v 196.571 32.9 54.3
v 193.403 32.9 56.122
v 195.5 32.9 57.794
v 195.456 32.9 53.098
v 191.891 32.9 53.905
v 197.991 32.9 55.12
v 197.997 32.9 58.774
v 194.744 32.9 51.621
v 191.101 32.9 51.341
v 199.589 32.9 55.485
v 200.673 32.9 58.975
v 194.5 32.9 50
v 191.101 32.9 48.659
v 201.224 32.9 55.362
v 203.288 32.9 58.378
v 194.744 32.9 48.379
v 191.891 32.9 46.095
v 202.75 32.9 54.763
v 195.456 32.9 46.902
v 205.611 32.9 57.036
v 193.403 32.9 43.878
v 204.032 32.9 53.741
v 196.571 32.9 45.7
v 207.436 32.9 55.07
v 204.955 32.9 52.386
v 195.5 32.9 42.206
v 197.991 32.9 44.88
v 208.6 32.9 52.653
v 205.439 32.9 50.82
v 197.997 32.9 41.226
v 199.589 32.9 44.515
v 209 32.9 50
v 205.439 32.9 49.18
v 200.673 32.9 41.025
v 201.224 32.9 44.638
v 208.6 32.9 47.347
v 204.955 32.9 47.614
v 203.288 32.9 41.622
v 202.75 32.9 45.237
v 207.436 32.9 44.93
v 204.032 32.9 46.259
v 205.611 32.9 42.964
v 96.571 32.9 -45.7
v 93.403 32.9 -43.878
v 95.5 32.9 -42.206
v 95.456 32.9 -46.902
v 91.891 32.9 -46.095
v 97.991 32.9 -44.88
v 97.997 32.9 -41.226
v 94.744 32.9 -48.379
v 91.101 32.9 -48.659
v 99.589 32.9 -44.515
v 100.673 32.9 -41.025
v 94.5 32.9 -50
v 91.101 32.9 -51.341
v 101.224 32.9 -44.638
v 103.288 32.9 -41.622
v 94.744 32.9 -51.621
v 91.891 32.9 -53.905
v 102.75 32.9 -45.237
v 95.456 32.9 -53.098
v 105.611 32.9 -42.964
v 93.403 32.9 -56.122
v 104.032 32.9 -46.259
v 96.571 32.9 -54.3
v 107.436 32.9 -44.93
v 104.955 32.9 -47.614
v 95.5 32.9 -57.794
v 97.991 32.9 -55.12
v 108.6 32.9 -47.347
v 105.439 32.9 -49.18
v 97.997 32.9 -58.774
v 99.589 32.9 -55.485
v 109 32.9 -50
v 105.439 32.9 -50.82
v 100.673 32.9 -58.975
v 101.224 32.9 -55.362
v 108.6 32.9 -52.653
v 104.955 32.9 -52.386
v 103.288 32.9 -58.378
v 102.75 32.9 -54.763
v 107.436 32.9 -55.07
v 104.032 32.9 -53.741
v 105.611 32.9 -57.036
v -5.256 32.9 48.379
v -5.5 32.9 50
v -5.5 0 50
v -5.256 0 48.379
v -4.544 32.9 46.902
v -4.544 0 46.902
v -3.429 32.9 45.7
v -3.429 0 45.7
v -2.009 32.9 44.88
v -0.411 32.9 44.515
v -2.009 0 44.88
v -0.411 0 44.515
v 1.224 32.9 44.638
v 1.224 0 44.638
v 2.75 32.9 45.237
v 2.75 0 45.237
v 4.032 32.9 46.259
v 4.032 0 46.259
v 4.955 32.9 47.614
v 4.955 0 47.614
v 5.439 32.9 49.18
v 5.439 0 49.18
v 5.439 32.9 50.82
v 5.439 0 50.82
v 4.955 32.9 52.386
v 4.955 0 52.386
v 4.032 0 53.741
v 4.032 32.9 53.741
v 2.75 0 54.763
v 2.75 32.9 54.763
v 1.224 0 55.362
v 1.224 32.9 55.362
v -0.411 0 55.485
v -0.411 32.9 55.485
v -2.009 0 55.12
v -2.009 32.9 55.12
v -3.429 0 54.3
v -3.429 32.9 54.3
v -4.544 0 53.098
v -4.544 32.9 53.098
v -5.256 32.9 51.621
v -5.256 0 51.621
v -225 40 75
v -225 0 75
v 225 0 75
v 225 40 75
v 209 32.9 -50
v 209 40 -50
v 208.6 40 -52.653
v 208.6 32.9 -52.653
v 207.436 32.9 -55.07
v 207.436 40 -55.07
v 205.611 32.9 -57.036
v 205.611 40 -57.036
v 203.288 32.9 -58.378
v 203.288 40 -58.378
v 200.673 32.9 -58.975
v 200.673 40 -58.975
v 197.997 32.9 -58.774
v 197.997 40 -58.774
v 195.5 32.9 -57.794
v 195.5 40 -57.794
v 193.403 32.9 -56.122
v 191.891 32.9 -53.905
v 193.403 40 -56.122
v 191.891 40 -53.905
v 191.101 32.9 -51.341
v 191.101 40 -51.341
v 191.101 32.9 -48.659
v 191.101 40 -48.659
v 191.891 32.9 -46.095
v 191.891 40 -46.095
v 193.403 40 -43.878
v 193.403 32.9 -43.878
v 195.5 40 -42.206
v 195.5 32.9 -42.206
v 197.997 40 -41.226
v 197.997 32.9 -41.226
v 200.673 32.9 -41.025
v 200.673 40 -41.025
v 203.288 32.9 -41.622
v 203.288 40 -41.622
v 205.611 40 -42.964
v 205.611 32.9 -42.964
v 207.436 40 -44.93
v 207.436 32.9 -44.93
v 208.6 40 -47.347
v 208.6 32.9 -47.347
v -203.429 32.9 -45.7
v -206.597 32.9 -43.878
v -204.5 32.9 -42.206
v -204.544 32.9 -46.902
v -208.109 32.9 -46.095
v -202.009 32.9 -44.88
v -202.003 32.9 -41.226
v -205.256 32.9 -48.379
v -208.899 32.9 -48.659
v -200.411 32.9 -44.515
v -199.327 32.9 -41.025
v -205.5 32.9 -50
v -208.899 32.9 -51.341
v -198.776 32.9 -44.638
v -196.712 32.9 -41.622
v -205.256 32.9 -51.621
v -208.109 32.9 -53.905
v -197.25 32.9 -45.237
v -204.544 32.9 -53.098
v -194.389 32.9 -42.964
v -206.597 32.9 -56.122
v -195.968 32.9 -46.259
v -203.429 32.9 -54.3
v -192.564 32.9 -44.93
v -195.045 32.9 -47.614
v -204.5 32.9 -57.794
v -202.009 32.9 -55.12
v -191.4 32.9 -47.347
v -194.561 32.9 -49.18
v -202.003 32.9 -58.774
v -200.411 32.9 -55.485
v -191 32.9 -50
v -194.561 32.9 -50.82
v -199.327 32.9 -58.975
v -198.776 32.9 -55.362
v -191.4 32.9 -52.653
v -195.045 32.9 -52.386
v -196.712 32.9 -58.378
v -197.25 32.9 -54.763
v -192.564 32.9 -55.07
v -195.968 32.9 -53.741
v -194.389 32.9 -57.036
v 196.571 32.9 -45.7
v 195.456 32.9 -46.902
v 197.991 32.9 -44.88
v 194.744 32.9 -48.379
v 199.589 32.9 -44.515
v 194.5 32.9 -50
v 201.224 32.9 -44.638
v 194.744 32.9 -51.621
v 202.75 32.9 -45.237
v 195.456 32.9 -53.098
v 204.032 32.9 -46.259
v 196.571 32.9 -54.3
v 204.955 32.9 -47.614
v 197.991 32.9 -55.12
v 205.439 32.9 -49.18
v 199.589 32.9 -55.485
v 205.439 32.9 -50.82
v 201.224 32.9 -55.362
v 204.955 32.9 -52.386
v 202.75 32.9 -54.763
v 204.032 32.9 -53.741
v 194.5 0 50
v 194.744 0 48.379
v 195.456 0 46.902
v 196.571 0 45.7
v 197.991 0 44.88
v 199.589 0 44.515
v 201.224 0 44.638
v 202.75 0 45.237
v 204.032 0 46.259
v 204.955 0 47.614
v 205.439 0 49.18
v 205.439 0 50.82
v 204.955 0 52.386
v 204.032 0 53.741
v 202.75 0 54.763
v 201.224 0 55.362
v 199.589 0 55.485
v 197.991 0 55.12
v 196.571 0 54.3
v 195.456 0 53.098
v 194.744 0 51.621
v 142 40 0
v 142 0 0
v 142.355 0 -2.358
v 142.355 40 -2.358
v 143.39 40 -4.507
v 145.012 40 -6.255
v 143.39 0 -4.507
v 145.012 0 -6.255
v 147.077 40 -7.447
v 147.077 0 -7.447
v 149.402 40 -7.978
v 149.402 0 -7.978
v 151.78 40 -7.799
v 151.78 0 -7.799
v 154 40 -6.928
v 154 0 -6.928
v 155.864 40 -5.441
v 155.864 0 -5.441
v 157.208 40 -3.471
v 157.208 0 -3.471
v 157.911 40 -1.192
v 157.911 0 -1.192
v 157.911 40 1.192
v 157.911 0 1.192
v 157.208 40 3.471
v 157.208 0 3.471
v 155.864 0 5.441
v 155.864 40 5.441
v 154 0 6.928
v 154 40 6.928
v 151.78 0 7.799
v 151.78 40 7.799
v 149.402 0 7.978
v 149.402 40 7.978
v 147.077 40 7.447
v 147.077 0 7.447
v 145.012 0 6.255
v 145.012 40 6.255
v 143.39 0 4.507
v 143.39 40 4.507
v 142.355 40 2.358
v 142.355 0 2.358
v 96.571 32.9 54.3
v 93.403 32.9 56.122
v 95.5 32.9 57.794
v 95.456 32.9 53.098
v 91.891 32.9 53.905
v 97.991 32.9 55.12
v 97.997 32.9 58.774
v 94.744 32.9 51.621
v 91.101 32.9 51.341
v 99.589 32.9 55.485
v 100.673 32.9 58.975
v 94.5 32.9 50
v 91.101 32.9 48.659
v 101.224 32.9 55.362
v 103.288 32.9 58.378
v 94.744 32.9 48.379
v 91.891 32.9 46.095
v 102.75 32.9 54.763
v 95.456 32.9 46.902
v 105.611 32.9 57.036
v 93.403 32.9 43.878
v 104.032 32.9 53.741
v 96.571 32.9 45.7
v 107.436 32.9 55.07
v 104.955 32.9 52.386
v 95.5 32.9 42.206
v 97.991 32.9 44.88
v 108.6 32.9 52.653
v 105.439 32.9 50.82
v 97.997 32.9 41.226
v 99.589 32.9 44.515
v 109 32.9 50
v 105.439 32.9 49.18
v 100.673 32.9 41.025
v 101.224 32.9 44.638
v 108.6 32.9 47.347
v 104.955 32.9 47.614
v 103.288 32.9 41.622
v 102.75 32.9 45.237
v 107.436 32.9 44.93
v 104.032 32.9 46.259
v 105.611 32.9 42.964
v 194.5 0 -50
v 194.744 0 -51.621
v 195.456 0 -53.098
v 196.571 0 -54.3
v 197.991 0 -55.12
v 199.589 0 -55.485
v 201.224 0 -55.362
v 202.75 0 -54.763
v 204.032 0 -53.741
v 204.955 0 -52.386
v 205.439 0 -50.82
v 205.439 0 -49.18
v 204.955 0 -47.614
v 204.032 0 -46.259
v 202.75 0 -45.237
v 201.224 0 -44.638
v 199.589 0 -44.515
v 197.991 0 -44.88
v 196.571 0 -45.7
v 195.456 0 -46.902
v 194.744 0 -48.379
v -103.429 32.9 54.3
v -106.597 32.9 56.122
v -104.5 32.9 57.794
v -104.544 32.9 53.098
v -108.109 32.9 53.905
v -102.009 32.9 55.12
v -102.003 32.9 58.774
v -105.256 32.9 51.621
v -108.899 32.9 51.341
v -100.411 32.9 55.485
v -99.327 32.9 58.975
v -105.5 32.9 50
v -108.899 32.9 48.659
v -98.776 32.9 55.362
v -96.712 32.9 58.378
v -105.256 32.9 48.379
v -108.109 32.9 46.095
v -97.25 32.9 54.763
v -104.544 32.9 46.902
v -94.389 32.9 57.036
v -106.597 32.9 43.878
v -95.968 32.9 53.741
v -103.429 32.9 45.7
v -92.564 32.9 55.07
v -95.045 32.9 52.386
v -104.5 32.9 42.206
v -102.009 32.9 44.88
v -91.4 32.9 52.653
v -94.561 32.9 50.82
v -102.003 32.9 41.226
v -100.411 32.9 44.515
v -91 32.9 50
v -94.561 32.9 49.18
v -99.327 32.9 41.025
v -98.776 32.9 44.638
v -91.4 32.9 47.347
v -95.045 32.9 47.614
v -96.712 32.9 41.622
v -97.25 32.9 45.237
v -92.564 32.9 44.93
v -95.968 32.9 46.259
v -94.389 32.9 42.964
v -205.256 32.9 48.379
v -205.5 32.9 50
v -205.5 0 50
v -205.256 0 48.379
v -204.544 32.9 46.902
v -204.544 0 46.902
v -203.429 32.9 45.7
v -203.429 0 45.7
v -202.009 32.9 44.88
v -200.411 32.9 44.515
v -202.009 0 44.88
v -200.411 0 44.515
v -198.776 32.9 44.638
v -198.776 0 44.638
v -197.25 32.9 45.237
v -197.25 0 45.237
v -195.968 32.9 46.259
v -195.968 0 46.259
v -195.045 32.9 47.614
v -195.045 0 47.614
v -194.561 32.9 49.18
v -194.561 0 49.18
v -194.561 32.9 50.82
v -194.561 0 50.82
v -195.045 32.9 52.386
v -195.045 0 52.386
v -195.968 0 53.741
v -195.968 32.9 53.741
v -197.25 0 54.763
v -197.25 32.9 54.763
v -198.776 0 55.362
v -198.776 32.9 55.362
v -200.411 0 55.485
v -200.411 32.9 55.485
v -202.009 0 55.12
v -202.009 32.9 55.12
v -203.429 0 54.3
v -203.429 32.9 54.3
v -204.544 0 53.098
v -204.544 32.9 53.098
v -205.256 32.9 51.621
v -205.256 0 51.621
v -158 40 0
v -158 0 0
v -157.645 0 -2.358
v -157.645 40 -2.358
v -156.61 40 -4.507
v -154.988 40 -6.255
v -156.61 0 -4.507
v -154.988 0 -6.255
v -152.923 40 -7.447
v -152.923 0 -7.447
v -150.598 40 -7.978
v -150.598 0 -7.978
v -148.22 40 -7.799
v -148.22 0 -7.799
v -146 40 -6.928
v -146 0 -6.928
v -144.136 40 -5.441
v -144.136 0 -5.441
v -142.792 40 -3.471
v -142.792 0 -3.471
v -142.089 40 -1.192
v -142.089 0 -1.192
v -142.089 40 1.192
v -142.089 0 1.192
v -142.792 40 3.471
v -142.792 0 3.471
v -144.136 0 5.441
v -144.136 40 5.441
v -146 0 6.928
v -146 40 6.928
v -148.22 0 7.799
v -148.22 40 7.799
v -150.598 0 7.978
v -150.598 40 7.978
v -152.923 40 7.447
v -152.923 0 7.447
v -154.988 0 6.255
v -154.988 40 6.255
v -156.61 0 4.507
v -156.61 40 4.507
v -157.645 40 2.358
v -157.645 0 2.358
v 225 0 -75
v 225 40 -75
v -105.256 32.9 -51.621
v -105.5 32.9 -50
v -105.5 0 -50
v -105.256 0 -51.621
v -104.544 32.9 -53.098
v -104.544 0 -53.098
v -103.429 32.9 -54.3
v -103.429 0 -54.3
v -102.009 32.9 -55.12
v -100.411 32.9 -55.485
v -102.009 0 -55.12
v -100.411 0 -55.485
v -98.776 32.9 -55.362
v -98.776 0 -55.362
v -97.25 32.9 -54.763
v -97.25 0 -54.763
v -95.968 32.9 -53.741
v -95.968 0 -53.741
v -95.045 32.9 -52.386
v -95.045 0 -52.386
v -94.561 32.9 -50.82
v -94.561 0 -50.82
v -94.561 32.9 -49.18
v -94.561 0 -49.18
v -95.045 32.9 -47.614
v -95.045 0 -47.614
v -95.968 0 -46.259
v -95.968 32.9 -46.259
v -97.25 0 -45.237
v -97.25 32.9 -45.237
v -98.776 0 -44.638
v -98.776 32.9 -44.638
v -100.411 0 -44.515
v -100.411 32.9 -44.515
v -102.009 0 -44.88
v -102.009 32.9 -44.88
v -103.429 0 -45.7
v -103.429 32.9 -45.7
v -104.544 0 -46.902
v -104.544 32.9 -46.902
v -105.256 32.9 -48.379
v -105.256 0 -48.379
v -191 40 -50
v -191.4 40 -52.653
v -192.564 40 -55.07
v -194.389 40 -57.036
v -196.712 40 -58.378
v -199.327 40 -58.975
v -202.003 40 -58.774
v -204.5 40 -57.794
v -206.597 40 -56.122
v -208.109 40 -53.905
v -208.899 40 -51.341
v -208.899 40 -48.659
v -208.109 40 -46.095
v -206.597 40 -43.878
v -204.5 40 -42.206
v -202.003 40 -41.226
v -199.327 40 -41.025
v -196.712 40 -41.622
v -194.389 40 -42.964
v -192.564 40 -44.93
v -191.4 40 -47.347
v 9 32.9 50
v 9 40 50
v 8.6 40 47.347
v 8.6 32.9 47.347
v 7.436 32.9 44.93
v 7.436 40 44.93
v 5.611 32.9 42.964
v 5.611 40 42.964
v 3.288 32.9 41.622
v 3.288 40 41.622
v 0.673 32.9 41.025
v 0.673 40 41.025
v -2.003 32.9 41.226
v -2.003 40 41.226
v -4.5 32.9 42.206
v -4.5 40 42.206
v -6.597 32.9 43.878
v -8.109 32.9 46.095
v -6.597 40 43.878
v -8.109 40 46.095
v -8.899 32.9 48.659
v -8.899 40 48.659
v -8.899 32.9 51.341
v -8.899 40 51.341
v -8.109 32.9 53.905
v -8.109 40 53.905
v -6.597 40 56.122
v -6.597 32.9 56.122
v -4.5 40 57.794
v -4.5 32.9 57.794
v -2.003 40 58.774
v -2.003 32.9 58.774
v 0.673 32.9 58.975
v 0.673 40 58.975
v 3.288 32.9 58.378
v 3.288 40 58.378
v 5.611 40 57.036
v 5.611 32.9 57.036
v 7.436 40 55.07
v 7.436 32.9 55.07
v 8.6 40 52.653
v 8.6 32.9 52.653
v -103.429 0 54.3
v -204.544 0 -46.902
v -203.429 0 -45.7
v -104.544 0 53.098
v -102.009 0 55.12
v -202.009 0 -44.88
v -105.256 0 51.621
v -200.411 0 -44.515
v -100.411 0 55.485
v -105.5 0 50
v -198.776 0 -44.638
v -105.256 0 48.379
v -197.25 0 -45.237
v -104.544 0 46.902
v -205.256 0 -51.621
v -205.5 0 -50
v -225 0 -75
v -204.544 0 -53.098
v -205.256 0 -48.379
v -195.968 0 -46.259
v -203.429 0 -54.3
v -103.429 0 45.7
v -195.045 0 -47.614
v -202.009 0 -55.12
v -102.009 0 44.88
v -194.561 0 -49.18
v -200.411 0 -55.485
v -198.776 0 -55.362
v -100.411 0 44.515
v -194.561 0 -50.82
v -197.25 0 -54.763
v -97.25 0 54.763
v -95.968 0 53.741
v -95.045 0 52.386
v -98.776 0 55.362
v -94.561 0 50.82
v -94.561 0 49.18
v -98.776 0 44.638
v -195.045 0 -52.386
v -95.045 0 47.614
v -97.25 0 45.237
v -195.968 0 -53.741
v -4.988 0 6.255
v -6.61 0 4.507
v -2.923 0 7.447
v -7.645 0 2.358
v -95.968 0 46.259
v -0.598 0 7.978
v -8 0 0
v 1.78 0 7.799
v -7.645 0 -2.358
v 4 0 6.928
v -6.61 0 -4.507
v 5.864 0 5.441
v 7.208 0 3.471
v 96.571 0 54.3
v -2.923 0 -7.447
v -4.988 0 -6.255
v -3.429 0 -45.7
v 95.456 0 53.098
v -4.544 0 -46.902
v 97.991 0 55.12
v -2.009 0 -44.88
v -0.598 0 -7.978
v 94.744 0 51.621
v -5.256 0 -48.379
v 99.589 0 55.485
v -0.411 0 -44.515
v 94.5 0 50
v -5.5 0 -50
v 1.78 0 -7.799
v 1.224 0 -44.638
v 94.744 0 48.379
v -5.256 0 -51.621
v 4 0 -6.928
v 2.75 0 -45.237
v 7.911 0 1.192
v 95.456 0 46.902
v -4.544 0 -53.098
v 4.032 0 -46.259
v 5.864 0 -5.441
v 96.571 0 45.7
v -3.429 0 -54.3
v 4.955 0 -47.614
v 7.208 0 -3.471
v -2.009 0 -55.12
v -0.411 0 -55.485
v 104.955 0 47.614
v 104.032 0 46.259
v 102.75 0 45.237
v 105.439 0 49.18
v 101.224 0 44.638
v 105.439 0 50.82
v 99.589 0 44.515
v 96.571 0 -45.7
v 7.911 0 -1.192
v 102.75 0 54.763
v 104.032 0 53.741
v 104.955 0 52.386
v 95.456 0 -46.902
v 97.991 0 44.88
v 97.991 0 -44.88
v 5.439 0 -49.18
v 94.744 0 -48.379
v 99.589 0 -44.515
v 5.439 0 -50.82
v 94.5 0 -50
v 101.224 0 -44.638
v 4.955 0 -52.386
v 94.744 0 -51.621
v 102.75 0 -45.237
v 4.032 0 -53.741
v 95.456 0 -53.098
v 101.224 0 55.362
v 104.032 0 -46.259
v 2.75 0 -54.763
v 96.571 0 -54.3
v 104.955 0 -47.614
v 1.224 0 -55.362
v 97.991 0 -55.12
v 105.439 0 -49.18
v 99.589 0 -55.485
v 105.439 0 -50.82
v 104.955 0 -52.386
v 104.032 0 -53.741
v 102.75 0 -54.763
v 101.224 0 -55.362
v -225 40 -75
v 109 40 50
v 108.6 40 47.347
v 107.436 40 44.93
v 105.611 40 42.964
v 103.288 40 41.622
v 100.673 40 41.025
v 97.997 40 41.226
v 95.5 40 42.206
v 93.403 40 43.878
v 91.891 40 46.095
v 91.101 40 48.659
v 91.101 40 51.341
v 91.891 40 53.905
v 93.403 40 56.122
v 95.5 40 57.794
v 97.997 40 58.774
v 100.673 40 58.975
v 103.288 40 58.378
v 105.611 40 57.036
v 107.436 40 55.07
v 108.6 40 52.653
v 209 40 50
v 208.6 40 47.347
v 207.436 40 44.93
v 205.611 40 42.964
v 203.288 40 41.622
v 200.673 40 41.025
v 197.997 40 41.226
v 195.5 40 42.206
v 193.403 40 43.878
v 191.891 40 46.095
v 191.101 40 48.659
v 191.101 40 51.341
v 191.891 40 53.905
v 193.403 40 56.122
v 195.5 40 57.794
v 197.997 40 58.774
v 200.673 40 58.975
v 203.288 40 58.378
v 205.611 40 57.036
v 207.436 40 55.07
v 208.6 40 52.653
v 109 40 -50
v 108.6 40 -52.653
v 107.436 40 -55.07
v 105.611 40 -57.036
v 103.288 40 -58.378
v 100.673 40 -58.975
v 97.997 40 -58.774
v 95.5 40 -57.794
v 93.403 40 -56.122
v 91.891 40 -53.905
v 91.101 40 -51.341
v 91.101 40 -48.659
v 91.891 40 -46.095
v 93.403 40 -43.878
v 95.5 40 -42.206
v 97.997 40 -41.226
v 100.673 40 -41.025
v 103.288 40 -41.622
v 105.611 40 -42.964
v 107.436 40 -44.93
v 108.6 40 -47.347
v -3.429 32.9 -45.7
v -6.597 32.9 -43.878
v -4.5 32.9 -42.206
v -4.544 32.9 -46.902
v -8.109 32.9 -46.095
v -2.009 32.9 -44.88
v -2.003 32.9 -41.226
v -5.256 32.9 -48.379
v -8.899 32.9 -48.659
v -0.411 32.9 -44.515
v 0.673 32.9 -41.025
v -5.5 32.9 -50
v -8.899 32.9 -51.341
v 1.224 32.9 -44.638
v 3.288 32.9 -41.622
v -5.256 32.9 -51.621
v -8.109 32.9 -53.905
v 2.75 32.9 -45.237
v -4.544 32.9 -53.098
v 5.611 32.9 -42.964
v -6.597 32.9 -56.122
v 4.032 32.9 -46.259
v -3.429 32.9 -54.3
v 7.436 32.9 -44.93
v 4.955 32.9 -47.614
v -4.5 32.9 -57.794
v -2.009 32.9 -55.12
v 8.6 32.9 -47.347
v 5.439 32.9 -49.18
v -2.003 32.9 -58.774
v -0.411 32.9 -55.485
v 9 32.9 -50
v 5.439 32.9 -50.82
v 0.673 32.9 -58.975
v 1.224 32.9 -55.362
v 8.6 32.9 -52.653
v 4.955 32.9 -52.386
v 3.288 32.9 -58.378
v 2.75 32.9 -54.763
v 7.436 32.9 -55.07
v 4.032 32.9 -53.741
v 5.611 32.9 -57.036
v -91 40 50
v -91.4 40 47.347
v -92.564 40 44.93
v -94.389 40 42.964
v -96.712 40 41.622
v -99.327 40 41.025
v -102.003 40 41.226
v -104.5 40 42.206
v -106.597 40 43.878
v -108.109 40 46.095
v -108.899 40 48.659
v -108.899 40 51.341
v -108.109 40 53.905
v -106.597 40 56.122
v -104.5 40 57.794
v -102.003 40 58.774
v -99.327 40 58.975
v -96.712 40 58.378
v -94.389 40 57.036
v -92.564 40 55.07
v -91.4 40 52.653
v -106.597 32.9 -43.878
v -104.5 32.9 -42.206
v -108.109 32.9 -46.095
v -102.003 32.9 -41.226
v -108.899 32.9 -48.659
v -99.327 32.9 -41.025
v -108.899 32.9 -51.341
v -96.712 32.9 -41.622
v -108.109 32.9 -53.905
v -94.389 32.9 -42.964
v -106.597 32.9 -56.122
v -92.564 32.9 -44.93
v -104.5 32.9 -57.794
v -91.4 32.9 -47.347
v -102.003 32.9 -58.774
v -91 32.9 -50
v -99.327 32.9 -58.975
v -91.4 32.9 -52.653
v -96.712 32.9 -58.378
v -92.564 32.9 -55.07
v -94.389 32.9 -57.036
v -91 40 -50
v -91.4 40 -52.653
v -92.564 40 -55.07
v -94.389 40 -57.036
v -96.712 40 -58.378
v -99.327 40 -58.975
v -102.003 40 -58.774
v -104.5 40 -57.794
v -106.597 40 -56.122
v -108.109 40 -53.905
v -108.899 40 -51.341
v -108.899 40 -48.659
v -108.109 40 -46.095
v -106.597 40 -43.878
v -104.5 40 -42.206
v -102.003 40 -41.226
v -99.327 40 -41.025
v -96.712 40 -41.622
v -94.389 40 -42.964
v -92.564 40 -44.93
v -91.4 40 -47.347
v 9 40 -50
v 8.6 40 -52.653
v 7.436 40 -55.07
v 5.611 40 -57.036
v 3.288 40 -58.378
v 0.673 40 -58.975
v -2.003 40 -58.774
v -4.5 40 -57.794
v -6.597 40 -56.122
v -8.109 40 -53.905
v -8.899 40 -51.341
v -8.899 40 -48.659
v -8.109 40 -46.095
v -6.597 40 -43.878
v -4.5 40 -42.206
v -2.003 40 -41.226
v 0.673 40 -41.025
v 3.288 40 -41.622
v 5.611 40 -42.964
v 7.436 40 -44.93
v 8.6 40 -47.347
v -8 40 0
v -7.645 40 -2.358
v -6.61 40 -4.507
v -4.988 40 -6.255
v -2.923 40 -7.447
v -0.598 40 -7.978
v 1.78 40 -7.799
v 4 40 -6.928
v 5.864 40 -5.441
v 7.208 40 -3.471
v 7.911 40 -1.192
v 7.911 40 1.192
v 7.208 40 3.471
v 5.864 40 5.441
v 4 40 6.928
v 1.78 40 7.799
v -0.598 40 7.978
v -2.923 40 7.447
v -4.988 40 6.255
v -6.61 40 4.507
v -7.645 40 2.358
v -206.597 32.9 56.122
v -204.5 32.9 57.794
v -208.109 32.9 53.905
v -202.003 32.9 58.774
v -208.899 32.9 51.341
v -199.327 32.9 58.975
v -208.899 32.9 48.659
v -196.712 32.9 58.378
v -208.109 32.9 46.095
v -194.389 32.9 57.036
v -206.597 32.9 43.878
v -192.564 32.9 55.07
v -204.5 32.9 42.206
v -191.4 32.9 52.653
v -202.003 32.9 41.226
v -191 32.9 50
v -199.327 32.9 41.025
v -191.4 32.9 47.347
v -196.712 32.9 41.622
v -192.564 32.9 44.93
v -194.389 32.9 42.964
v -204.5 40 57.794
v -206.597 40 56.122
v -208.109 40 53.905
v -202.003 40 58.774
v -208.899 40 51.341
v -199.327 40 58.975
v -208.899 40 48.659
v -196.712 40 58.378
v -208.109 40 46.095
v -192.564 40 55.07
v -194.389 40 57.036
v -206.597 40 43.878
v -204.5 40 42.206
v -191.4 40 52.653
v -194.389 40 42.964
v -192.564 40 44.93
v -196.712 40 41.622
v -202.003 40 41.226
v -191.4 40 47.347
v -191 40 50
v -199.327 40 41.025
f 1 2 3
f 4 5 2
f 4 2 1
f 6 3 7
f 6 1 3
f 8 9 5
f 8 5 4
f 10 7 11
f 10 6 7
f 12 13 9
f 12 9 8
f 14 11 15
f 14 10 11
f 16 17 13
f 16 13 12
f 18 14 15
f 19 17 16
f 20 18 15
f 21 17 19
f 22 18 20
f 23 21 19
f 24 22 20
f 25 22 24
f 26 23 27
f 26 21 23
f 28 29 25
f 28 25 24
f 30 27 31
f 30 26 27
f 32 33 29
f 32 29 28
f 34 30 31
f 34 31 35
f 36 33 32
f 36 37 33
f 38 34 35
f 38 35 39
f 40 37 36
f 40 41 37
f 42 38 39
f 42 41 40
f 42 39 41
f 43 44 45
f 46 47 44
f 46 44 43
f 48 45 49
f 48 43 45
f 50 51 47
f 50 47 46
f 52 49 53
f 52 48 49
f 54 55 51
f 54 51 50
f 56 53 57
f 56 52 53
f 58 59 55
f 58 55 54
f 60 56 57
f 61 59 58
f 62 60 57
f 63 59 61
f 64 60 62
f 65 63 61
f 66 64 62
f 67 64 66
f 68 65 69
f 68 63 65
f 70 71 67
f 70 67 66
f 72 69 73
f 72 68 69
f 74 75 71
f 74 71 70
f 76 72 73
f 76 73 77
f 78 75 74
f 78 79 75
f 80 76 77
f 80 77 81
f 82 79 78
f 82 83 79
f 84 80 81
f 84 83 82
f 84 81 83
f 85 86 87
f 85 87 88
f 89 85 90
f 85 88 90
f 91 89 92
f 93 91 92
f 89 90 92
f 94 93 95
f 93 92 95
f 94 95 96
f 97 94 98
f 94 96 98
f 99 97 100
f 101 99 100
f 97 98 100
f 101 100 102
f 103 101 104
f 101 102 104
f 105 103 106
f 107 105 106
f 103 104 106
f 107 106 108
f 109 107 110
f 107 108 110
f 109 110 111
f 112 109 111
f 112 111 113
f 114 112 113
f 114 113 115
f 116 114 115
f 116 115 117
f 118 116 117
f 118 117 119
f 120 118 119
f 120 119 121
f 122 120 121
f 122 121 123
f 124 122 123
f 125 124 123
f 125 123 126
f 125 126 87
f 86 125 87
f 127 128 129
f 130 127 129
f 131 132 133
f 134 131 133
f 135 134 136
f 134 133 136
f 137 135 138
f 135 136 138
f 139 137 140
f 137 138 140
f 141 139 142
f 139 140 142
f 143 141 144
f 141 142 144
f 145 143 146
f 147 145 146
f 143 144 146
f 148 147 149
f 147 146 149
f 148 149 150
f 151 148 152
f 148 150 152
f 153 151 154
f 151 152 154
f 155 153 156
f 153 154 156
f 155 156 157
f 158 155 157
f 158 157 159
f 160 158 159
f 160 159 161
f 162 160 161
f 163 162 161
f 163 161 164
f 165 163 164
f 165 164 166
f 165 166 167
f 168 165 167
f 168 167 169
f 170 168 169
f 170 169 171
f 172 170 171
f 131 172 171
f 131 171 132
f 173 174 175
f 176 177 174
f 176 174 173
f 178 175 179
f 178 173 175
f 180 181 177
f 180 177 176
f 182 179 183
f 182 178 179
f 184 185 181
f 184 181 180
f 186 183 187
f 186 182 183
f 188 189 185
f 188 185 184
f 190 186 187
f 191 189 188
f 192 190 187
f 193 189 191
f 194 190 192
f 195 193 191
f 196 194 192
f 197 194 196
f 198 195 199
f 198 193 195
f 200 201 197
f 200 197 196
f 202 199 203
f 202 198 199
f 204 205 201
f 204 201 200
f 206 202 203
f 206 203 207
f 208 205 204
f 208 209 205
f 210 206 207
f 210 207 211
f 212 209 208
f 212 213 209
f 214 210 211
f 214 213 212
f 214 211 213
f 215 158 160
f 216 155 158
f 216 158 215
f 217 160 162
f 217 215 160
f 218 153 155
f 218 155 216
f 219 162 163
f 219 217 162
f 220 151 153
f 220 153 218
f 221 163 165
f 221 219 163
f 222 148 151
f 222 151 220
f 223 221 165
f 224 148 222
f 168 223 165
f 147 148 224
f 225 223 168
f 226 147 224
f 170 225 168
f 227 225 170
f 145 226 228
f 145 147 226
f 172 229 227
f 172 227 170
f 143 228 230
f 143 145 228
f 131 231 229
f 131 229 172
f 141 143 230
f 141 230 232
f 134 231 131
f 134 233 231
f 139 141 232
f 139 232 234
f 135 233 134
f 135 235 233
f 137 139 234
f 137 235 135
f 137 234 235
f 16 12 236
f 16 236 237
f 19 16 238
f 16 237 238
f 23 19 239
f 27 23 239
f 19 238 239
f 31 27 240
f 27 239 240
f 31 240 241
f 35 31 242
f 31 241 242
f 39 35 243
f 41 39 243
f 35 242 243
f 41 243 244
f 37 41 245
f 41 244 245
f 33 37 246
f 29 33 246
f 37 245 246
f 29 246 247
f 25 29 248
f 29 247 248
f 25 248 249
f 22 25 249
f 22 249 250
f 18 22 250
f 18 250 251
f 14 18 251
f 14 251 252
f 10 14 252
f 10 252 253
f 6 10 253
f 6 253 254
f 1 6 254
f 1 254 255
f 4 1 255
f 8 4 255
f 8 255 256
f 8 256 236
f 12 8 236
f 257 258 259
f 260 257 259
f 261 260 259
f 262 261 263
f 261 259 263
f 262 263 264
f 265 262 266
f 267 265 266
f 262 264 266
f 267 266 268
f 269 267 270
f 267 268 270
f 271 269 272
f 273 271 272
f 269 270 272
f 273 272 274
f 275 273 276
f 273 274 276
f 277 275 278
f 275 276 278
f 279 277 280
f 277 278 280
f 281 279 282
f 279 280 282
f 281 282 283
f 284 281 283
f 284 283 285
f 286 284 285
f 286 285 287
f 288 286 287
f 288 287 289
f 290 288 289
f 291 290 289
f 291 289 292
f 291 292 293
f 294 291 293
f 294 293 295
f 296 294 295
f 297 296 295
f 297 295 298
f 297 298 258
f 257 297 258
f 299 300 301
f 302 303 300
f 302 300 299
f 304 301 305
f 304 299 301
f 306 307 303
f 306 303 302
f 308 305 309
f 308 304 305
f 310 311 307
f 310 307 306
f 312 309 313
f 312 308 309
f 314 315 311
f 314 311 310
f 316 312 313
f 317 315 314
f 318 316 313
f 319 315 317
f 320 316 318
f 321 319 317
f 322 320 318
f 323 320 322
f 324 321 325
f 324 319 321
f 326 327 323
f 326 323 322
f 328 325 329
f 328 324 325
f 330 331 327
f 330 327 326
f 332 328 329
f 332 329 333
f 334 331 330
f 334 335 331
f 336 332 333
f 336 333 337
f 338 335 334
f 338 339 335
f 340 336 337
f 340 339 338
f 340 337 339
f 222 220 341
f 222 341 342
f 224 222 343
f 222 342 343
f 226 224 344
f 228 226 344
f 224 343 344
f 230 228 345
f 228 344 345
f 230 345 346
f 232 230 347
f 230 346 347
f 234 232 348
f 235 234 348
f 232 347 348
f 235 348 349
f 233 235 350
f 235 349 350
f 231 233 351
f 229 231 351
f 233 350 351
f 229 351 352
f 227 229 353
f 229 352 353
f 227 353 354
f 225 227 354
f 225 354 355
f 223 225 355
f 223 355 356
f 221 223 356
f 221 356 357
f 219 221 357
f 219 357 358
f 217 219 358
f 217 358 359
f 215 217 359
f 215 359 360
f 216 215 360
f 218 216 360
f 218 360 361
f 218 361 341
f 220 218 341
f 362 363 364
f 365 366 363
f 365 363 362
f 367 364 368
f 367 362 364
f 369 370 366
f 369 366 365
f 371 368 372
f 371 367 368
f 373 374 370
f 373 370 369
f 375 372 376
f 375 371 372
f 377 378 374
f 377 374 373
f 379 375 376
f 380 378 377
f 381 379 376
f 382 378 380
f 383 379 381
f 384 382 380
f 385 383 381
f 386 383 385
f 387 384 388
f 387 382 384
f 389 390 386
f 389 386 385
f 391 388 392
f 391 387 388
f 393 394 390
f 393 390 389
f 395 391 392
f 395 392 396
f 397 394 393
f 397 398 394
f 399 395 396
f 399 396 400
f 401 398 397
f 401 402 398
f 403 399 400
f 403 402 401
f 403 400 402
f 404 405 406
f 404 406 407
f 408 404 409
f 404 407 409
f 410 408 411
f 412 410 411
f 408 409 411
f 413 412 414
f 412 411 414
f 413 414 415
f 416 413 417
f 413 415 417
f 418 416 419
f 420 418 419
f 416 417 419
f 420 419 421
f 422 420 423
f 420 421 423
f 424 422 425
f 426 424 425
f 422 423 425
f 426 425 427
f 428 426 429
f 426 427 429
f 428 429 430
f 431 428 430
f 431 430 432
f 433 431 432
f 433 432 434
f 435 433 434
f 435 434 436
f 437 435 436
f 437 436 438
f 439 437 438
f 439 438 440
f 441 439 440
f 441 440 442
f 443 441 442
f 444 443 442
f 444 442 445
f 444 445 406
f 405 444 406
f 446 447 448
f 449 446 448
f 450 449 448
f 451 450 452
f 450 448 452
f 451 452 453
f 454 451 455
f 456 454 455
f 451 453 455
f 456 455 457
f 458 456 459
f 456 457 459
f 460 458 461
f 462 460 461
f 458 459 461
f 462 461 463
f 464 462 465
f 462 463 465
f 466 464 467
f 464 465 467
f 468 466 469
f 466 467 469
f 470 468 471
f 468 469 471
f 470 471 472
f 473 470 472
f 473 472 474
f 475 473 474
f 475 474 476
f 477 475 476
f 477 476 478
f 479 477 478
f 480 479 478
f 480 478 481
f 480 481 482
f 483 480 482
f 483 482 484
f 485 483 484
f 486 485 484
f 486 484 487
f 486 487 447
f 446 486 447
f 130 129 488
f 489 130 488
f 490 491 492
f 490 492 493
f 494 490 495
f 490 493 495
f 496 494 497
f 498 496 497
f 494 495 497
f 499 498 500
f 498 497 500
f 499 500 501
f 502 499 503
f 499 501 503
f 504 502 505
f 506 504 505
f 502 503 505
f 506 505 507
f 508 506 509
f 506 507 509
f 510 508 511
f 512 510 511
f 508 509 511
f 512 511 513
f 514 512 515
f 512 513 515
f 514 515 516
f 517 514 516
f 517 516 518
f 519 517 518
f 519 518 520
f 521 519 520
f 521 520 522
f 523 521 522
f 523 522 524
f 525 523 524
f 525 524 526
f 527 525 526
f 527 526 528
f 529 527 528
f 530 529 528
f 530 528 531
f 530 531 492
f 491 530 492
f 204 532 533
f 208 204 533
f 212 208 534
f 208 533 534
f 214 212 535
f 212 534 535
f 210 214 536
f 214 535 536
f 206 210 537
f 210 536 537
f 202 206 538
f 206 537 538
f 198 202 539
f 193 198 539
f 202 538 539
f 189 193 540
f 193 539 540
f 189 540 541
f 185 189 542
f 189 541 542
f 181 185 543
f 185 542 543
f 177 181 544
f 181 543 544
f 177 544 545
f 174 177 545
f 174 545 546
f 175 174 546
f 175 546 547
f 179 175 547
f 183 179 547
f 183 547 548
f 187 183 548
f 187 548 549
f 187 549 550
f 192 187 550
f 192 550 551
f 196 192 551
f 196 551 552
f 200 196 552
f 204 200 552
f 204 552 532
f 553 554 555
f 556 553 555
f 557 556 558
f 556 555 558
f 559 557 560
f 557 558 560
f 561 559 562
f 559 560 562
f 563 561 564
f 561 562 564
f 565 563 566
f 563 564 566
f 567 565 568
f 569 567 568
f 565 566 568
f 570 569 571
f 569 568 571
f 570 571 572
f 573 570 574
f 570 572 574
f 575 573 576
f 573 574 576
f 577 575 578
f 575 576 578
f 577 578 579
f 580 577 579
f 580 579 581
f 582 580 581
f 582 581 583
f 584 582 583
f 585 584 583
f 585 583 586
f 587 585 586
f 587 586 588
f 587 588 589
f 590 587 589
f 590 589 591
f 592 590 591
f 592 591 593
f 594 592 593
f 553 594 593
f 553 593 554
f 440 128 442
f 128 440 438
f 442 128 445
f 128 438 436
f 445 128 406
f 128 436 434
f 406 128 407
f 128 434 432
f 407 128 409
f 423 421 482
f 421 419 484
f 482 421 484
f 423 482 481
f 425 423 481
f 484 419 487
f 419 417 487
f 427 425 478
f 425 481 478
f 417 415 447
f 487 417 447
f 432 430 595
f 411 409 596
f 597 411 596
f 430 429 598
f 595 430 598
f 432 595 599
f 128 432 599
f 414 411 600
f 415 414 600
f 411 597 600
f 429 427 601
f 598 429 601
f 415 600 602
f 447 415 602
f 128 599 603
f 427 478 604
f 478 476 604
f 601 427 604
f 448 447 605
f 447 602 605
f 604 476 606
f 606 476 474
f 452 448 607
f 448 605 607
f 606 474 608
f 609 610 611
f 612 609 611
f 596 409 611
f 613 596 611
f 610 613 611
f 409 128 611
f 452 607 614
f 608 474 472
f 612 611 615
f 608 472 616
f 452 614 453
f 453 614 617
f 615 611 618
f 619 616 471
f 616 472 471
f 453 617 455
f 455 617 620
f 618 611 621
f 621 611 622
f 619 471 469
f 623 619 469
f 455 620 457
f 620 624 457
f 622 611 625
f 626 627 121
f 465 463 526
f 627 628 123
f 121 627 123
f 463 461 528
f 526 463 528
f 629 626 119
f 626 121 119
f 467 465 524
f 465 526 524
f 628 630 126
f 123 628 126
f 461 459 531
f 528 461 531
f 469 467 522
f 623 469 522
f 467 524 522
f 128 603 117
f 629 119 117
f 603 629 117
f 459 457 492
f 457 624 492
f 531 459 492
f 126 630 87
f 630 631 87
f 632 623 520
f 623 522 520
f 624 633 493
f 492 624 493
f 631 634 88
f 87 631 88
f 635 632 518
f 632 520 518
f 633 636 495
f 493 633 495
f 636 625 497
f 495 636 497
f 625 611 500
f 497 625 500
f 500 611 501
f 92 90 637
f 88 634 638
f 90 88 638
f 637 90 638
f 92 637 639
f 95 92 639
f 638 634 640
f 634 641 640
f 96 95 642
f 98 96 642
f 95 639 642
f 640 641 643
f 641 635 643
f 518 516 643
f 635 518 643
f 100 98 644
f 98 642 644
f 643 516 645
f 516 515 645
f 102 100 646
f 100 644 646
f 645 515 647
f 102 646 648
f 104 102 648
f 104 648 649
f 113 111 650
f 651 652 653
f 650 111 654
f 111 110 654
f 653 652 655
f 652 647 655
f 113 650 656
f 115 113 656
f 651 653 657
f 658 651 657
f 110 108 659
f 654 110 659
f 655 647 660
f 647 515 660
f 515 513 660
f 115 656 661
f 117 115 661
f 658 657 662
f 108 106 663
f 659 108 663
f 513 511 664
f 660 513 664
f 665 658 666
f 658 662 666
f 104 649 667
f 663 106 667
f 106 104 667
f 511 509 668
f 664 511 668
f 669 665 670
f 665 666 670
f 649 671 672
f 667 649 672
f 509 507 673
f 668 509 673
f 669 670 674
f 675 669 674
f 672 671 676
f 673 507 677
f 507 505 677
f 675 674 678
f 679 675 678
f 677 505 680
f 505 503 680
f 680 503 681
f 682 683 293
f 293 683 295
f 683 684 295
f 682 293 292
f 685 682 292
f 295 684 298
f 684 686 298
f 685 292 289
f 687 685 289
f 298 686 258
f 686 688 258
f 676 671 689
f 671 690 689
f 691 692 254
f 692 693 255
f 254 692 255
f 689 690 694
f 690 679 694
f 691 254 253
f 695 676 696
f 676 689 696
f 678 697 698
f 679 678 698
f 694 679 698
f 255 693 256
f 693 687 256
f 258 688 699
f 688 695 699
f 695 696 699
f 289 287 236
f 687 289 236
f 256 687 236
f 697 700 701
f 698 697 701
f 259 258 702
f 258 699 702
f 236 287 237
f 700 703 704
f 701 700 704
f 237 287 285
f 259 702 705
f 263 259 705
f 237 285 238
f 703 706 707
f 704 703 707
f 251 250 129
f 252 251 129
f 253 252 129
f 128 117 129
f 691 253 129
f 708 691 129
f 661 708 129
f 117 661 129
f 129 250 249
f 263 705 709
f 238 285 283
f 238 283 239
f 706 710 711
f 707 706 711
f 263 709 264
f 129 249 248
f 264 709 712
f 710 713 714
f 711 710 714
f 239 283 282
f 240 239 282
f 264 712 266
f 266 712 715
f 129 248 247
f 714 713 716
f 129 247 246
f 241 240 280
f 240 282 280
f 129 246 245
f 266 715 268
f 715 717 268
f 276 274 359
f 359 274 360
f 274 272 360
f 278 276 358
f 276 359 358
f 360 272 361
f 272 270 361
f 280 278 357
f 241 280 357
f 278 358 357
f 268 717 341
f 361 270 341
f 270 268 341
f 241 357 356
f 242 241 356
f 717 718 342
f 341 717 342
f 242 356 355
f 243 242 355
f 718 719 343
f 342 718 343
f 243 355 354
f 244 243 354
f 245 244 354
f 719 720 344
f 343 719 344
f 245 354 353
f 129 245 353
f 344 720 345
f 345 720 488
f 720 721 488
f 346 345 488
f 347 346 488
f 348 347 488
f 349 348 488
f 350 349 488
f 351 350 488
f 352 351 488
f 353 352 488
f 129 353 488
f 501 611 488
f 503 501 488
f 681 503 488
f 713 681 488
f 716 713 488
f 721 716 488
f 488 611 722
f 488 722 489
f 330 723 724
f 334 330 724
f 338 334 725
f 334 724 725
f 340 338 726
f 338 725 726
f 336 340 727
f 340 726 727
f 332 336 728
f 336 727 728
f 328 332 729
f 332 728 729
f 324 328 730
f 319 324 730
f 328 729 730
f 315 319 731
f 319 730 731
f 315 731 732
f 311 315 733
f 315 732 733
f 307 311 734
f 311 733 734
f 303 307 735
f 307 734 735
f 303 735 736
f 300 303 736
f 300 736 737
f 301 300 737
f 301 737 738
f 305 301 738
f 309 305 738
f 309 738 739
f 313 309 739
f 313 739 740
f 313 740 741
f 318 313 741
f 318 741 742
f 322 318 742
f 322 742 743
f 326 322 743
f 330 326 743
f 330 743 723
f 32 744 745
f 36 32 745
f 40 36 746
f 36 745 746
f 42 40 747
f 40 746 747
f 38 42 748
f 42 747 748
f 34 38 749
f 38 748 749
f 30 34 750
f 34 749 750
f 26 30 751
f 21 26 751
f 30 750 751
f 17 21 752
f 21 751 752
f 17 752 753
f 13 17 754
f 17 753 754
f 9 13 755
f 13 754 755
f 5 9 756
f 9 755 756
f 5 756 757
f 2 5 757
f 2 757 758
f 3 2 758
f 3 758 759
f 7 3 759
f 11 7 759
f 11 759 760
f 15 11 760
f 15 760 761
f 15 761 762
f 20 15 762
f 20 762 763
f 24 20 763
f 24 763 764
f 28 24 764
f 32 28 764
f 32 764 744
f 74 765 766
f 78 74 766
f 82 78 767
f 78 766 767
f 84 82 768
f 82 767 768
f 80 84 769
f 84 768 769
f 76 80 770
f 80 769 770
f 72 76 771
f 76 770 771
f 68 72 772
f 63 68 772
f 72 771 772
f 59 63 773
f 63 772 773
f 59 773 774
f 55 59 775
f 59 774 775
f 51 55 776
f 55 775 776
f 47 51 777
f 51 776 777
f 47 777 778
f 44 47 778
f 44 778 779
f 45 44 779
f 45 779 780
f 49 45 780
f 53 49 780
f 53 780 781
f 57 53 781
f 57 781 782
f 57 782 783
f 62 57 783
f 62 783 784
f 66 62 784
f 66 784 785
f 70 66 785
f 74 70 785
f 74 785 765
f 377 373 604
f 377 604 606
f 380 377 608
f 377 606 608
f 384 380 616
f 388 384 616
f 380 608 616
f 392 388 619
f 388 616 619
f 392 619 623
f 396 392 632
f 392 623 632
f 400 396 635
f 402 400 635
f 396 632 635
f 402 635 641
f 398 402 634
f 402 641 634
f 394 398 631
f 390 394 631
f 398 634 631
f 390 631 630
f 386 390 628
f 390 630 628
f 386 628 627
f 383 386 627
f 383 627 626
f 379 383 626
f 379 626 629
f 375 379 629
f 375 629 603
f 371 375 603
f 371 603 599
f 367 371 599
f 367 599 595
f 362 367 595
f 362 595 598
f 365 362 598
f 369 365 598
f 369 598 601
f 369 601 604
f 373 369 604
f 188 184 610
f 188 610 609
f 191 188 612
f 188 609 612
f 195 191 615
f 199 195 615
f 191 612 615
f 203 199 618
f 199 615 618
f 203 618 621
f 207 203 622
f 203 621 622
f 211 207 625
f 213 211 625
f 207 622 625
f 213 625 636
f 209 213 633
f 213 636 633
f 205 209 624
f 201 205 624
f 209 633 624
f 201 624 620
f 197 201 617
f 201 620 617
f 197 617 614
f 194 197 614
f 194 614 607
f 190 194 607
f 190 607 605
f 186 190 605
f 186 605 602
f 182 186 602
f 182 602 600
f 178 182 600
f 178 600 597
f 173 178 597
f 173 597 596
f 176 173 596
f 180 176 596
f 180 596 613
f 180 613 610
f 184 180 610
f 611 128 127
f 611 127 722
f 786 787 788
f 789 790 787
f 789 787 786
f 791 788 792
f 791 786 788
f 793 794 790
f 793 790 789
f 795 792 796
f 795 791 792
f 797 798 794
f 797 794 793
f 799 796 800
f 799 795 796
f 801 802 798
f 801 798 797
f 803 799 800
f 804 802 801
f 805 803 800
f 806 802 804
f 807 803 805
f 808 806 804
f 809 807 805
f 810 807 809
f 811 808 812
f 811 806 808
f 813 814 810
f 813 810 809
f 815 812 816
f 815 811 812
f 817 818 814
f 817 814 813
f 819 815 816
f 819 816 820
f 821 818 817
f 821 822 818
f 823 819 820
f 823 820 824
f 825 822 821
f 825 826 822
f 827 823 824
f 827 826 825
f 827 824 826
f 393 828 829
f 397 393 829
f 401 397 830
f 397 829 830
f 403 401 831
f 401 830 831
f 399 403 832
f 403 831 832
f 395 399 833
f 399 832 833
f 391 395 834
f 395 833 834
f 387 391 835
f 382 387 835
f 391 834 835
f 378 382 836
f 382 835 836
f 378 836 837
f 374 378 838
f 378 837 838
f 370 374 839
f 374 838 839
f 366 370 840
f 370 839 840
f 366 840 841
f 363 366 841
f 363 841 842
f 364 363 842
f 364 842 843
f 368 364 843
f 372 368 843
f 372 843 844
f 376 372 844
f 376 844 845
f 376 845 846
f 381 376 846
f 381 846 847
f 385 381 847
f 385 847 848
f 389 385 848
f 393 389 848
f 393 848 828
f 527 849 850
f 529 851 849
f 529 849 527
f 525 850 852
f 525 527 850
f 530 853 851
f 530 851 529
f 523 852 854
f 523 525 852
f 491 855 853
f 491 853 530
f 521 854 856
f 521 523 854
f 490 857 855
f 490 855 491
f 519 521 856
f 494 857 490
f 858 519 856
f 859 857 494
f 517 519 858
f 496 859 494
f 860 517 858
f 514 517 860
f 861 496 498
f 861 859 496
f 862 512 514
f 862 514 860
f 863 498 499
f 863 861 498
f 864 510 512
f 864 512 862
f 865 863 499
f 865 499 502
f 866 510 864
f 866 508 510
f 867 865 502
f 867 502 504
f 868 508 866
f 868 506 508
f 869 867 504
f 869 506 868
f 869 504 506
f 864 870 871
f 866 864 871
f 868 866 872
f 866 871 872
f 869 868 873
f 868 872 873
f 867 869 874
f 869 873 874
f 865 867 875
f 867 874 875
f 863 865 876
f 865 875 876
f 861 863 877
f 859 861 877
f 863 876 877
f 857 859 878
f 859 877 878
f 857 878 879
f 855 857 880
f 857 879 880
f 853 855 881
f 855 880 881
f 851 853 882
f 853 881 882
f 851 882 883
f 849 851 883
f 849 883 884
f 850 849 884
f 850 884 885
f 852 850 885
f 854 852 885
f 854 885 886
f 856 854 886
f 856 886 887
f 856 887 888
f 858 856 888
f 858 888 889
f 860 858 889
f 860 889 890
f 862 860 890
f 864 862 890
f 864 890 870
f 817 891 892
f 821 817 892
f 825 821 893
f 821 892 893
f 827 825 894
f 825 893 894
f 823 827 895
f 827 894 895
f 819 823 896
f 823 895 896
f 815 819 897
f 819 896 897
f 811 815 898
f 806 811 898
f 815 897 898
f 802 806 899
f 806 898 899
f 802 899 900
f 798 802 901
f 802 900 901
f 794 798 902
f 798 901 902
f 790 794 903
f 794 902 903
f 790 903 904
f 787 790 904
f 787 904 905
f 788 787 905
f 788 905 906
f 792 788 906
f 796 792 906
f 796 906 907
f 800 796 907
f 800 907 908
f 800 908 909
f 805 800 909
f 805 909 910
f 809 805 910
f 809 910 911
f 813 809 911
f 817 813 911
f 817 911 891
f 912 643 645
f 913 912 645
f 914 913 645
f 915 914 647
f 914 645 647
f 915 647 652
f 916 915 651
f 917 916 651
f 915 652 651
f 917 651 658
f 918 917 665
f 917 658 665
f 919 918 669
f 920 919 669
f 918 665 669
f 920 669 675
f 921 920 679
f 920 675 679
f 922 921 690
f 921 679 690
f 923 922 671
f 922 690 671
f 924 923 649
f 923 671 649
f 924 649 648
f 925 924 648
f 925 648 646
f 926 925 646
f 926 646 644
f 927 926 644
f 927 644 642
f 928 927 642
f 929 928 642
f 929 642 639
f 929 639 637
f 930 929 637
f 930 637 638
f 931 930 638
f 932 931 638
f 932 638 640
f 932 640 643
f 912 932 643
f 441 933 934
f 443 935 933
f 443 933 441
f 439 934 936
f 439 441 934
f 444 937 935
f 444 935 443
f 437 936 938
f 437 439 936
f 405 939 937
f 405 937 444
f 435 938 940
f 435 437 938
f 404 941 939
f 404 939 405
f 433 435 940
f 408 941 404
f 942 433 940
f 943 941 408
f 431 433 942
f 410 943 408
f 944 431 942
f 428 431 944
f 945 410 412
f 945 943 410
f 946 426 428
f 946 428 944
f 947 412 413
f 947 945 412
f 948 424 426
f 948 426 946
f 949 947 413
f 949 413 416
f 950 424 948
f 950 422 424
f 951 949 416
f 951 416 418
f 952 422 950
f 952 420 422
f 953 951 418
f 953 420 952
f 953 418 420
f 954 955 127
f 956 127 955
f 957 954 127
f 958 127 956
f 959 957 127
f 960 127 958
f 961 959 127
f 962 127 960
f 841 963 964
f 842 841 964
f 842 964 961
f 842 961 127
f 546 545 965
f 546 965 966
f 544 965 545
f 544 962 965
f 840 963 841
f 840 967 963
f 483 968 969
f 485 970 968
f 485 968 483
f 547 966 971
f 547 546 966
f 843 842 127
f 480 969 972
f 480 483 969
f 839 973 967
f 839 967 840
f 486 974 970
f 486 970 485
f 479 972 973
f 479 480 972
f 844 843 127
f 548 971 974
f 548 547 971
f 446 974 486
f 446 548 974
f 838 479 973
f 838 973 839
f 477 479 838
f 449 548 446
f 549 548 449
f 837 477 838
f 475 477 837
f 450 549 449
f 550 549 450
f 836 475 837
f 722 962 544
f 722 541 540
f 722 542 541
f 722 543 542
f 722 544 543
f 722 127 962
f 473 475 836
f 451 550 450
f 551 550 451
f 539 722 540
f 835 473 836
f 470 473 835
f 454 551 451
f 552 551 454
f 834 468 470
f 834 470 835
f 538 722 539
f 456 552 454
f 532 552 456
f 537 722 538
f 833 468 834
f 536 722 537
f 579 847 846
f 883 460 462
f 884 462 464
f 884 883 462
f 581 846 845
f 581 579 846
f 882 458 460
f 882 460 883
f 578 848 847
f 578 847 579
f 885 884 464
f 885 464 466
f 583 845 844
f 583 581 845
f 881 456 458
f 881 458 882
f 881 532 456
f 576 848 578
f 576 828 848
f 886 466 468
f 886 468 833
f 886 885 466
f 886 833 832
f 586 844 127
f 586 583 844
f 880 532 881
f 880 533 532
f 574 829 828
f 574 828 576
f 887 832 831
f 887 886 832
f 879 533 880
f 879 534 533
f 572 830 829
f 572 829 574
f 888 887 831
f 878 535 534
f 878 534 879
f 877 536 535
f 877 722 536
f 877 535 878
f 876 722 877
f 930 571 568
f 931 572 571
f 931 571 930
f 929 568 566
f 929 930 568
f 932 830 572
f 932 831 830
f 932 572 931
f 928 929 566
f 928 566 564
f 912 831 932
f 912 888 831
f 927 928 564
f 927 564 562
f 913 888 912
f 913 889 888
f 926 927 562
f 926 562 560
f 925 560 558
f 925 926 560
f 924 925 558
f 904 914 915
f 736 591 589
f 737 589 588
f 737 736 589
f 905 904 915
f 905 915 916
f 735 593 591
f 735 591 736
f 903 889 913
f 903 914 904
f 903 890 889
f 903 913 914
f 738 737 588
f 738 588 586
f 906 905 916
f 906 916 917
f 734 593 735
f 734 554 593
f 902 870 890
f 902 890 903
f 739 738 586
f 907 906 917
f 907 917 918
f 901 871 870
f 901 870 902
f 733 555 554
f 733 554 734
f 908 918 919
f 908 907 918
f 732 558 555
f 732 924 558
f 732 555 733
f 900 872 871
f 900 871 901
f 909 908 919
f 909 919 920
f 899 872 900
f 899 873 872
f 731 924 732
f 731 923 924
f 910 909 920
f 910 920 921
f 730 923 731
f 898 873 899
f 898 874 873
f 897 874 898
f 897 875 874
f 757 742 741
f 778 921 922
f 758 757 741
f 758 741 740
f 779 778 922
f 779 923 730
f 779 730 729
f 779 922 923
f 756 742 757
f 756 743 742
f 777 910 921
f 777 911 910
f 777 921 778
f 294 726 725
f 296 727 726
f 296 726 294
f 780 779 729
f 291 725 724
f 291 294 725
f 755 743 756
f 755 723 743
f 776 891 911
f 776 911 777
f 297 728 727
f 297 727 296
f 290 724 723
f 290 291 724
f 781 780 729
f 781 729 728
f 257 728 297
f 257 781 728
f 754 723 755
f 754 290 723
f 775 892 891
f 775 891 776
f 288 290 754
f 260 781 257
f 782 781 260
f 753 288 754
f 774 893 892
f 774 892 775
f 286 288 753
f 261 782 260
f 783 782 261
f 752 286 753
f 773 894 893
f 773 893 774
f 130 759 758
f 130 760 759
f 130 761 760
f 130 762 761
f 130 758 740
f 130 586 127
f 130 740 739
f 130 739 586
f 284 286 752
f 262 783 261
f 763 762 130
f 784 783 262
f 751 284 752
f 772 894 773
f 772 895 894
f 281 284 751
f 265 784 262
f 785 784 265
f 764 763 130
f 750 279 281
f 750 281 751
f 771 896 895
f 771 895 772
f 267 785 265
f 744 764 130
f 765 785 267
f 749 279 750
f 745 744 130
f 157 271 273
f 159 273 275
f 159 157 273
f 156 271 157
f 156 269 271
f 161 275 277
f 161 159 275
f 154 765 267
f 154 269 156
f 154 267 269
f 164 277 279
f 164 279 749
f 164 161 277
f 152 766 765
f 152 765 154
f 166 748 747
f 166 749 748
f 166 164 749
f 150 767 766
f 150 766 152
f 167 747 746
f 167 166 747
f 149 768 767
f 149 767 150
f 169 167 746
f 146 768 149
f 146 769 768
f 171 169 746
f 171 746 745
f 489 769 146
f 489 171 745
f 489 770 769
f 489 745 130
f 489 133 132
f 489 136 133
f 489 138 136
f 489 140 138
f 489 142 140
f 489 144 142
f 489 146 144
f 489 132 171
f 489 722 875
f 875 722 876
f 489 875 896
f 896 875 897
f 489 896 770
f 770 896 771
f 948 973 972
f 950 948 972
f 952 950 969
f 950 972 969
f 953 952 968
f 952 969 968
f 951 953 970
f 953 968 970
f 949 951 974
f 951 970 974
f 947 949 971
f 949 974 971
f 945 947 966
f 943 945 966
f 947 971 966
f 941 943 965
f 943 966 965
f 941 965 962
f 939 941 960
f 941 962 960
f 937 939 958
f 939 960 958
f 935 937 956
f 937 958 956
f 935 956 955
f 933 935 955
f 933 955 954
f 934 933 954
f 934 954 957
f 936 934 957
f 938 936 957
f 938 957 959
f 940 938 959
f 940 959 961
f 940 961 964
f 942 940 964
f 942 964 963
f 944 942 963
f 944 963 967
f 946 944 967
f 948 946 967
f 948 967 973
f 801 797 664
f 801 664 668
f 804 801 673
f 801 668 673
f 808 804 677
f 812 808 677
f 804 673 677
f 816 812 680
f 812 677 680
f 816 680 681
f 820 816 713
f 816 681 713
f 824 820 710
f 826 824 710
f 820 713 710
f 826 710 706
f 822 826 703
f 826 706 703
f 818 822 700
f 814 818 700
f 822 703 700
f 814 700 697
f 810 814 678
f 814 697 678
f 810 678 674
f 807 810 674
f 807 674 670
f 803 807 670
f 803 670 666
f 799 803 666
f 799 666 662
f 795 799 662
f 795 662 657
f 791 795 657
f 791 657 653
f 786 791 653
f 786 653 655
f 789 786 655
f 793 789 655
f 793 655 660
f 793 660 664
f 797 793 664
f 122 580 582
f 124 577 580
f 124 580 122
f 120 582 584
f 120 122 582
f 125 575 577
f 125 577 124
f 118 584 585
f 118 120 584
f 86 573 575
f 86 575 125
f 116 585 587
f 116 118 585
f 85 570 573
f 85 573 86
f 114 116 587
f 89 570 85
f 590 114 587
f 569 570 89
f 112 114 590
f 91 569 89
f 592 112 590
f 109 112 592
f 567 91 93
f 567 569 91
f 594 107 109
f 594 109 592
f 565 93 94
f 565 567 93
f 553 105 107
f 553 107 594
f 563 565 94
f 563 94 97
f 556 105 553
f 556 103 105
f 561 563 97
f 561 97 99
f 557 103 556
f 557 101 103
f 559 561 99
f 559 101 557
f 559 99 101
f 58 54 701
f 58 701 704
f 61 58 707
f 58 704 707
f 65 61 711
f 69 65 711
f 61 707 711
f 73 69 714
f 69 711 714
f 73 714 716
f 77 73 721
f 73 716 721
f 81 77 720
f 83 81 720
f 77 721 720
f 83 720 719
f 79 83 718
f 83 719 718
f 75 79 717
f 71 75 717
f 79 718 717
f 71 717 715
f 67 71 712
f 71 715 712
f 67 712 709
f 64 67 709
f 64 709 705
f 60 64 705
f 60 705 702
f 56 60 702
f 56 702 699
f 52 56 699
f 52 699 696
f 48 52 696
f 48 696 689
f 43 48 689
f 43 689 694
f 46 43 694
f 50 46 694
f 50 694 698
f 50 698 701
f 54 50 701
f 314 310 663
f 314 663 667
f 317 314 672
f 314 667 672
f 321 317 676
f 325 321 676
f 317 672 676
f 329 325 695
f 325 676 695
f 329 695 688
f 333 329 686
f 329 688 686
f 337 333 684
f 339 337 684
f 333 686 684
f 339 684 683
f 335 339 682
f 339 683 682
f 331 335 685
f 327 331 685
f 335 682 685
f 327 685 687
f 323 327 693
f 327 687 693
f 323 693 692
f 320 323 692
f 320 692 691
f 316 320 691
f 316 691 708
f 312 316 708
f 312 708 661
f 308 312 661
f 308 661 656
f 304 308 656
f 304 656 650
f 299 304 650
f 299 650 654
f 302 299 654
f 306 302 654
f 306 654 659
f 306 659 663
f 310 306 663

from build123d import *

# Parameters (mm, degrees)
ESBO_O1_W                                            = 450
ESBO_O1_H                                            = 150
RESSALTO_EXTRUS_O1_DEPTH                             = 40
REBAIXO_PARA_PARAFUSO_ALLEN_SEXTAVADO_DE_D           = 11
REBAIXO_PARA_PARAFUSO_ALLEN_SEXTAVADO_DE_DEPTH       = 40
REBAIXO_PARA_PARAFUSO_ALLEN_SEXTAVADO_DE_CBORE_D     = 18
REBAIXO_PARA_PARAFUSO_ALLEN_SEXTAVADO_DE_CBORE_DEPTH = 7.1
FURO_ROSCADO_DE_M18X2_0_D                            = 16
FURO_ROSCADO_DE_M18X2_0_DEPTH                        = 40


with BuildPart() as part:
    # Esboço1 → Ressalto-extrusão1 (new body)
    with BuildSketch(Plane(origin=(0, 0, 0), x_dir=(1, 0, 0), z_dir=(0, 1, 0))):
        Rectangle(ESBO_O1_W, ESBO_O1_H)
    extrude(amount=RESSALTO_EXTRUS_O1_DEPTH)

    # Rebaixo para parafuso Allen sextavado de M101
    with Locations(Plane(origin=(0, 40, 0), x_dir=(1, 0, 0), z_dir=(0, 1, 0))):
        with Locations((-200, 50), (-100, 50), (0, 50), (100, 50), (200, 50), (-100, -50), (0, -50), (100, -50), (200, -50), (-200, -50)):
            CounterBoreHole(REBAIXO_PARA_PARAFUSO_ALLEN_SEXTAVADO_DE_D / 2, REBAIXO_PARA_PARAFUSO_ALLEN_SEXTAVADO_DE_CBORE_D / 2, REBAIXO_PARA_PARAFUSO_ALLEN_SEXTAVADO_DE_CBORE_DEPTH, depth=REBAIXO_PARA_PARAFUSO_ALLEN_SEXTAVADO_DE_DEPTH)

    # Furo roscado de M18x2.0
    with Locations(Plane(origin=(0, 40, 0), x_dir=(1, 0, 0), z_dir=(0, 1, 0))):
        with Locations((0, 0), (150, 0), (-150, 0)):
            Hole(FURO_ROSCADO_DE_M18X2_0_D / 2, depth=FURO_ROSCADO_DE_M18X2_0_DEPTH)


solid = part.part
